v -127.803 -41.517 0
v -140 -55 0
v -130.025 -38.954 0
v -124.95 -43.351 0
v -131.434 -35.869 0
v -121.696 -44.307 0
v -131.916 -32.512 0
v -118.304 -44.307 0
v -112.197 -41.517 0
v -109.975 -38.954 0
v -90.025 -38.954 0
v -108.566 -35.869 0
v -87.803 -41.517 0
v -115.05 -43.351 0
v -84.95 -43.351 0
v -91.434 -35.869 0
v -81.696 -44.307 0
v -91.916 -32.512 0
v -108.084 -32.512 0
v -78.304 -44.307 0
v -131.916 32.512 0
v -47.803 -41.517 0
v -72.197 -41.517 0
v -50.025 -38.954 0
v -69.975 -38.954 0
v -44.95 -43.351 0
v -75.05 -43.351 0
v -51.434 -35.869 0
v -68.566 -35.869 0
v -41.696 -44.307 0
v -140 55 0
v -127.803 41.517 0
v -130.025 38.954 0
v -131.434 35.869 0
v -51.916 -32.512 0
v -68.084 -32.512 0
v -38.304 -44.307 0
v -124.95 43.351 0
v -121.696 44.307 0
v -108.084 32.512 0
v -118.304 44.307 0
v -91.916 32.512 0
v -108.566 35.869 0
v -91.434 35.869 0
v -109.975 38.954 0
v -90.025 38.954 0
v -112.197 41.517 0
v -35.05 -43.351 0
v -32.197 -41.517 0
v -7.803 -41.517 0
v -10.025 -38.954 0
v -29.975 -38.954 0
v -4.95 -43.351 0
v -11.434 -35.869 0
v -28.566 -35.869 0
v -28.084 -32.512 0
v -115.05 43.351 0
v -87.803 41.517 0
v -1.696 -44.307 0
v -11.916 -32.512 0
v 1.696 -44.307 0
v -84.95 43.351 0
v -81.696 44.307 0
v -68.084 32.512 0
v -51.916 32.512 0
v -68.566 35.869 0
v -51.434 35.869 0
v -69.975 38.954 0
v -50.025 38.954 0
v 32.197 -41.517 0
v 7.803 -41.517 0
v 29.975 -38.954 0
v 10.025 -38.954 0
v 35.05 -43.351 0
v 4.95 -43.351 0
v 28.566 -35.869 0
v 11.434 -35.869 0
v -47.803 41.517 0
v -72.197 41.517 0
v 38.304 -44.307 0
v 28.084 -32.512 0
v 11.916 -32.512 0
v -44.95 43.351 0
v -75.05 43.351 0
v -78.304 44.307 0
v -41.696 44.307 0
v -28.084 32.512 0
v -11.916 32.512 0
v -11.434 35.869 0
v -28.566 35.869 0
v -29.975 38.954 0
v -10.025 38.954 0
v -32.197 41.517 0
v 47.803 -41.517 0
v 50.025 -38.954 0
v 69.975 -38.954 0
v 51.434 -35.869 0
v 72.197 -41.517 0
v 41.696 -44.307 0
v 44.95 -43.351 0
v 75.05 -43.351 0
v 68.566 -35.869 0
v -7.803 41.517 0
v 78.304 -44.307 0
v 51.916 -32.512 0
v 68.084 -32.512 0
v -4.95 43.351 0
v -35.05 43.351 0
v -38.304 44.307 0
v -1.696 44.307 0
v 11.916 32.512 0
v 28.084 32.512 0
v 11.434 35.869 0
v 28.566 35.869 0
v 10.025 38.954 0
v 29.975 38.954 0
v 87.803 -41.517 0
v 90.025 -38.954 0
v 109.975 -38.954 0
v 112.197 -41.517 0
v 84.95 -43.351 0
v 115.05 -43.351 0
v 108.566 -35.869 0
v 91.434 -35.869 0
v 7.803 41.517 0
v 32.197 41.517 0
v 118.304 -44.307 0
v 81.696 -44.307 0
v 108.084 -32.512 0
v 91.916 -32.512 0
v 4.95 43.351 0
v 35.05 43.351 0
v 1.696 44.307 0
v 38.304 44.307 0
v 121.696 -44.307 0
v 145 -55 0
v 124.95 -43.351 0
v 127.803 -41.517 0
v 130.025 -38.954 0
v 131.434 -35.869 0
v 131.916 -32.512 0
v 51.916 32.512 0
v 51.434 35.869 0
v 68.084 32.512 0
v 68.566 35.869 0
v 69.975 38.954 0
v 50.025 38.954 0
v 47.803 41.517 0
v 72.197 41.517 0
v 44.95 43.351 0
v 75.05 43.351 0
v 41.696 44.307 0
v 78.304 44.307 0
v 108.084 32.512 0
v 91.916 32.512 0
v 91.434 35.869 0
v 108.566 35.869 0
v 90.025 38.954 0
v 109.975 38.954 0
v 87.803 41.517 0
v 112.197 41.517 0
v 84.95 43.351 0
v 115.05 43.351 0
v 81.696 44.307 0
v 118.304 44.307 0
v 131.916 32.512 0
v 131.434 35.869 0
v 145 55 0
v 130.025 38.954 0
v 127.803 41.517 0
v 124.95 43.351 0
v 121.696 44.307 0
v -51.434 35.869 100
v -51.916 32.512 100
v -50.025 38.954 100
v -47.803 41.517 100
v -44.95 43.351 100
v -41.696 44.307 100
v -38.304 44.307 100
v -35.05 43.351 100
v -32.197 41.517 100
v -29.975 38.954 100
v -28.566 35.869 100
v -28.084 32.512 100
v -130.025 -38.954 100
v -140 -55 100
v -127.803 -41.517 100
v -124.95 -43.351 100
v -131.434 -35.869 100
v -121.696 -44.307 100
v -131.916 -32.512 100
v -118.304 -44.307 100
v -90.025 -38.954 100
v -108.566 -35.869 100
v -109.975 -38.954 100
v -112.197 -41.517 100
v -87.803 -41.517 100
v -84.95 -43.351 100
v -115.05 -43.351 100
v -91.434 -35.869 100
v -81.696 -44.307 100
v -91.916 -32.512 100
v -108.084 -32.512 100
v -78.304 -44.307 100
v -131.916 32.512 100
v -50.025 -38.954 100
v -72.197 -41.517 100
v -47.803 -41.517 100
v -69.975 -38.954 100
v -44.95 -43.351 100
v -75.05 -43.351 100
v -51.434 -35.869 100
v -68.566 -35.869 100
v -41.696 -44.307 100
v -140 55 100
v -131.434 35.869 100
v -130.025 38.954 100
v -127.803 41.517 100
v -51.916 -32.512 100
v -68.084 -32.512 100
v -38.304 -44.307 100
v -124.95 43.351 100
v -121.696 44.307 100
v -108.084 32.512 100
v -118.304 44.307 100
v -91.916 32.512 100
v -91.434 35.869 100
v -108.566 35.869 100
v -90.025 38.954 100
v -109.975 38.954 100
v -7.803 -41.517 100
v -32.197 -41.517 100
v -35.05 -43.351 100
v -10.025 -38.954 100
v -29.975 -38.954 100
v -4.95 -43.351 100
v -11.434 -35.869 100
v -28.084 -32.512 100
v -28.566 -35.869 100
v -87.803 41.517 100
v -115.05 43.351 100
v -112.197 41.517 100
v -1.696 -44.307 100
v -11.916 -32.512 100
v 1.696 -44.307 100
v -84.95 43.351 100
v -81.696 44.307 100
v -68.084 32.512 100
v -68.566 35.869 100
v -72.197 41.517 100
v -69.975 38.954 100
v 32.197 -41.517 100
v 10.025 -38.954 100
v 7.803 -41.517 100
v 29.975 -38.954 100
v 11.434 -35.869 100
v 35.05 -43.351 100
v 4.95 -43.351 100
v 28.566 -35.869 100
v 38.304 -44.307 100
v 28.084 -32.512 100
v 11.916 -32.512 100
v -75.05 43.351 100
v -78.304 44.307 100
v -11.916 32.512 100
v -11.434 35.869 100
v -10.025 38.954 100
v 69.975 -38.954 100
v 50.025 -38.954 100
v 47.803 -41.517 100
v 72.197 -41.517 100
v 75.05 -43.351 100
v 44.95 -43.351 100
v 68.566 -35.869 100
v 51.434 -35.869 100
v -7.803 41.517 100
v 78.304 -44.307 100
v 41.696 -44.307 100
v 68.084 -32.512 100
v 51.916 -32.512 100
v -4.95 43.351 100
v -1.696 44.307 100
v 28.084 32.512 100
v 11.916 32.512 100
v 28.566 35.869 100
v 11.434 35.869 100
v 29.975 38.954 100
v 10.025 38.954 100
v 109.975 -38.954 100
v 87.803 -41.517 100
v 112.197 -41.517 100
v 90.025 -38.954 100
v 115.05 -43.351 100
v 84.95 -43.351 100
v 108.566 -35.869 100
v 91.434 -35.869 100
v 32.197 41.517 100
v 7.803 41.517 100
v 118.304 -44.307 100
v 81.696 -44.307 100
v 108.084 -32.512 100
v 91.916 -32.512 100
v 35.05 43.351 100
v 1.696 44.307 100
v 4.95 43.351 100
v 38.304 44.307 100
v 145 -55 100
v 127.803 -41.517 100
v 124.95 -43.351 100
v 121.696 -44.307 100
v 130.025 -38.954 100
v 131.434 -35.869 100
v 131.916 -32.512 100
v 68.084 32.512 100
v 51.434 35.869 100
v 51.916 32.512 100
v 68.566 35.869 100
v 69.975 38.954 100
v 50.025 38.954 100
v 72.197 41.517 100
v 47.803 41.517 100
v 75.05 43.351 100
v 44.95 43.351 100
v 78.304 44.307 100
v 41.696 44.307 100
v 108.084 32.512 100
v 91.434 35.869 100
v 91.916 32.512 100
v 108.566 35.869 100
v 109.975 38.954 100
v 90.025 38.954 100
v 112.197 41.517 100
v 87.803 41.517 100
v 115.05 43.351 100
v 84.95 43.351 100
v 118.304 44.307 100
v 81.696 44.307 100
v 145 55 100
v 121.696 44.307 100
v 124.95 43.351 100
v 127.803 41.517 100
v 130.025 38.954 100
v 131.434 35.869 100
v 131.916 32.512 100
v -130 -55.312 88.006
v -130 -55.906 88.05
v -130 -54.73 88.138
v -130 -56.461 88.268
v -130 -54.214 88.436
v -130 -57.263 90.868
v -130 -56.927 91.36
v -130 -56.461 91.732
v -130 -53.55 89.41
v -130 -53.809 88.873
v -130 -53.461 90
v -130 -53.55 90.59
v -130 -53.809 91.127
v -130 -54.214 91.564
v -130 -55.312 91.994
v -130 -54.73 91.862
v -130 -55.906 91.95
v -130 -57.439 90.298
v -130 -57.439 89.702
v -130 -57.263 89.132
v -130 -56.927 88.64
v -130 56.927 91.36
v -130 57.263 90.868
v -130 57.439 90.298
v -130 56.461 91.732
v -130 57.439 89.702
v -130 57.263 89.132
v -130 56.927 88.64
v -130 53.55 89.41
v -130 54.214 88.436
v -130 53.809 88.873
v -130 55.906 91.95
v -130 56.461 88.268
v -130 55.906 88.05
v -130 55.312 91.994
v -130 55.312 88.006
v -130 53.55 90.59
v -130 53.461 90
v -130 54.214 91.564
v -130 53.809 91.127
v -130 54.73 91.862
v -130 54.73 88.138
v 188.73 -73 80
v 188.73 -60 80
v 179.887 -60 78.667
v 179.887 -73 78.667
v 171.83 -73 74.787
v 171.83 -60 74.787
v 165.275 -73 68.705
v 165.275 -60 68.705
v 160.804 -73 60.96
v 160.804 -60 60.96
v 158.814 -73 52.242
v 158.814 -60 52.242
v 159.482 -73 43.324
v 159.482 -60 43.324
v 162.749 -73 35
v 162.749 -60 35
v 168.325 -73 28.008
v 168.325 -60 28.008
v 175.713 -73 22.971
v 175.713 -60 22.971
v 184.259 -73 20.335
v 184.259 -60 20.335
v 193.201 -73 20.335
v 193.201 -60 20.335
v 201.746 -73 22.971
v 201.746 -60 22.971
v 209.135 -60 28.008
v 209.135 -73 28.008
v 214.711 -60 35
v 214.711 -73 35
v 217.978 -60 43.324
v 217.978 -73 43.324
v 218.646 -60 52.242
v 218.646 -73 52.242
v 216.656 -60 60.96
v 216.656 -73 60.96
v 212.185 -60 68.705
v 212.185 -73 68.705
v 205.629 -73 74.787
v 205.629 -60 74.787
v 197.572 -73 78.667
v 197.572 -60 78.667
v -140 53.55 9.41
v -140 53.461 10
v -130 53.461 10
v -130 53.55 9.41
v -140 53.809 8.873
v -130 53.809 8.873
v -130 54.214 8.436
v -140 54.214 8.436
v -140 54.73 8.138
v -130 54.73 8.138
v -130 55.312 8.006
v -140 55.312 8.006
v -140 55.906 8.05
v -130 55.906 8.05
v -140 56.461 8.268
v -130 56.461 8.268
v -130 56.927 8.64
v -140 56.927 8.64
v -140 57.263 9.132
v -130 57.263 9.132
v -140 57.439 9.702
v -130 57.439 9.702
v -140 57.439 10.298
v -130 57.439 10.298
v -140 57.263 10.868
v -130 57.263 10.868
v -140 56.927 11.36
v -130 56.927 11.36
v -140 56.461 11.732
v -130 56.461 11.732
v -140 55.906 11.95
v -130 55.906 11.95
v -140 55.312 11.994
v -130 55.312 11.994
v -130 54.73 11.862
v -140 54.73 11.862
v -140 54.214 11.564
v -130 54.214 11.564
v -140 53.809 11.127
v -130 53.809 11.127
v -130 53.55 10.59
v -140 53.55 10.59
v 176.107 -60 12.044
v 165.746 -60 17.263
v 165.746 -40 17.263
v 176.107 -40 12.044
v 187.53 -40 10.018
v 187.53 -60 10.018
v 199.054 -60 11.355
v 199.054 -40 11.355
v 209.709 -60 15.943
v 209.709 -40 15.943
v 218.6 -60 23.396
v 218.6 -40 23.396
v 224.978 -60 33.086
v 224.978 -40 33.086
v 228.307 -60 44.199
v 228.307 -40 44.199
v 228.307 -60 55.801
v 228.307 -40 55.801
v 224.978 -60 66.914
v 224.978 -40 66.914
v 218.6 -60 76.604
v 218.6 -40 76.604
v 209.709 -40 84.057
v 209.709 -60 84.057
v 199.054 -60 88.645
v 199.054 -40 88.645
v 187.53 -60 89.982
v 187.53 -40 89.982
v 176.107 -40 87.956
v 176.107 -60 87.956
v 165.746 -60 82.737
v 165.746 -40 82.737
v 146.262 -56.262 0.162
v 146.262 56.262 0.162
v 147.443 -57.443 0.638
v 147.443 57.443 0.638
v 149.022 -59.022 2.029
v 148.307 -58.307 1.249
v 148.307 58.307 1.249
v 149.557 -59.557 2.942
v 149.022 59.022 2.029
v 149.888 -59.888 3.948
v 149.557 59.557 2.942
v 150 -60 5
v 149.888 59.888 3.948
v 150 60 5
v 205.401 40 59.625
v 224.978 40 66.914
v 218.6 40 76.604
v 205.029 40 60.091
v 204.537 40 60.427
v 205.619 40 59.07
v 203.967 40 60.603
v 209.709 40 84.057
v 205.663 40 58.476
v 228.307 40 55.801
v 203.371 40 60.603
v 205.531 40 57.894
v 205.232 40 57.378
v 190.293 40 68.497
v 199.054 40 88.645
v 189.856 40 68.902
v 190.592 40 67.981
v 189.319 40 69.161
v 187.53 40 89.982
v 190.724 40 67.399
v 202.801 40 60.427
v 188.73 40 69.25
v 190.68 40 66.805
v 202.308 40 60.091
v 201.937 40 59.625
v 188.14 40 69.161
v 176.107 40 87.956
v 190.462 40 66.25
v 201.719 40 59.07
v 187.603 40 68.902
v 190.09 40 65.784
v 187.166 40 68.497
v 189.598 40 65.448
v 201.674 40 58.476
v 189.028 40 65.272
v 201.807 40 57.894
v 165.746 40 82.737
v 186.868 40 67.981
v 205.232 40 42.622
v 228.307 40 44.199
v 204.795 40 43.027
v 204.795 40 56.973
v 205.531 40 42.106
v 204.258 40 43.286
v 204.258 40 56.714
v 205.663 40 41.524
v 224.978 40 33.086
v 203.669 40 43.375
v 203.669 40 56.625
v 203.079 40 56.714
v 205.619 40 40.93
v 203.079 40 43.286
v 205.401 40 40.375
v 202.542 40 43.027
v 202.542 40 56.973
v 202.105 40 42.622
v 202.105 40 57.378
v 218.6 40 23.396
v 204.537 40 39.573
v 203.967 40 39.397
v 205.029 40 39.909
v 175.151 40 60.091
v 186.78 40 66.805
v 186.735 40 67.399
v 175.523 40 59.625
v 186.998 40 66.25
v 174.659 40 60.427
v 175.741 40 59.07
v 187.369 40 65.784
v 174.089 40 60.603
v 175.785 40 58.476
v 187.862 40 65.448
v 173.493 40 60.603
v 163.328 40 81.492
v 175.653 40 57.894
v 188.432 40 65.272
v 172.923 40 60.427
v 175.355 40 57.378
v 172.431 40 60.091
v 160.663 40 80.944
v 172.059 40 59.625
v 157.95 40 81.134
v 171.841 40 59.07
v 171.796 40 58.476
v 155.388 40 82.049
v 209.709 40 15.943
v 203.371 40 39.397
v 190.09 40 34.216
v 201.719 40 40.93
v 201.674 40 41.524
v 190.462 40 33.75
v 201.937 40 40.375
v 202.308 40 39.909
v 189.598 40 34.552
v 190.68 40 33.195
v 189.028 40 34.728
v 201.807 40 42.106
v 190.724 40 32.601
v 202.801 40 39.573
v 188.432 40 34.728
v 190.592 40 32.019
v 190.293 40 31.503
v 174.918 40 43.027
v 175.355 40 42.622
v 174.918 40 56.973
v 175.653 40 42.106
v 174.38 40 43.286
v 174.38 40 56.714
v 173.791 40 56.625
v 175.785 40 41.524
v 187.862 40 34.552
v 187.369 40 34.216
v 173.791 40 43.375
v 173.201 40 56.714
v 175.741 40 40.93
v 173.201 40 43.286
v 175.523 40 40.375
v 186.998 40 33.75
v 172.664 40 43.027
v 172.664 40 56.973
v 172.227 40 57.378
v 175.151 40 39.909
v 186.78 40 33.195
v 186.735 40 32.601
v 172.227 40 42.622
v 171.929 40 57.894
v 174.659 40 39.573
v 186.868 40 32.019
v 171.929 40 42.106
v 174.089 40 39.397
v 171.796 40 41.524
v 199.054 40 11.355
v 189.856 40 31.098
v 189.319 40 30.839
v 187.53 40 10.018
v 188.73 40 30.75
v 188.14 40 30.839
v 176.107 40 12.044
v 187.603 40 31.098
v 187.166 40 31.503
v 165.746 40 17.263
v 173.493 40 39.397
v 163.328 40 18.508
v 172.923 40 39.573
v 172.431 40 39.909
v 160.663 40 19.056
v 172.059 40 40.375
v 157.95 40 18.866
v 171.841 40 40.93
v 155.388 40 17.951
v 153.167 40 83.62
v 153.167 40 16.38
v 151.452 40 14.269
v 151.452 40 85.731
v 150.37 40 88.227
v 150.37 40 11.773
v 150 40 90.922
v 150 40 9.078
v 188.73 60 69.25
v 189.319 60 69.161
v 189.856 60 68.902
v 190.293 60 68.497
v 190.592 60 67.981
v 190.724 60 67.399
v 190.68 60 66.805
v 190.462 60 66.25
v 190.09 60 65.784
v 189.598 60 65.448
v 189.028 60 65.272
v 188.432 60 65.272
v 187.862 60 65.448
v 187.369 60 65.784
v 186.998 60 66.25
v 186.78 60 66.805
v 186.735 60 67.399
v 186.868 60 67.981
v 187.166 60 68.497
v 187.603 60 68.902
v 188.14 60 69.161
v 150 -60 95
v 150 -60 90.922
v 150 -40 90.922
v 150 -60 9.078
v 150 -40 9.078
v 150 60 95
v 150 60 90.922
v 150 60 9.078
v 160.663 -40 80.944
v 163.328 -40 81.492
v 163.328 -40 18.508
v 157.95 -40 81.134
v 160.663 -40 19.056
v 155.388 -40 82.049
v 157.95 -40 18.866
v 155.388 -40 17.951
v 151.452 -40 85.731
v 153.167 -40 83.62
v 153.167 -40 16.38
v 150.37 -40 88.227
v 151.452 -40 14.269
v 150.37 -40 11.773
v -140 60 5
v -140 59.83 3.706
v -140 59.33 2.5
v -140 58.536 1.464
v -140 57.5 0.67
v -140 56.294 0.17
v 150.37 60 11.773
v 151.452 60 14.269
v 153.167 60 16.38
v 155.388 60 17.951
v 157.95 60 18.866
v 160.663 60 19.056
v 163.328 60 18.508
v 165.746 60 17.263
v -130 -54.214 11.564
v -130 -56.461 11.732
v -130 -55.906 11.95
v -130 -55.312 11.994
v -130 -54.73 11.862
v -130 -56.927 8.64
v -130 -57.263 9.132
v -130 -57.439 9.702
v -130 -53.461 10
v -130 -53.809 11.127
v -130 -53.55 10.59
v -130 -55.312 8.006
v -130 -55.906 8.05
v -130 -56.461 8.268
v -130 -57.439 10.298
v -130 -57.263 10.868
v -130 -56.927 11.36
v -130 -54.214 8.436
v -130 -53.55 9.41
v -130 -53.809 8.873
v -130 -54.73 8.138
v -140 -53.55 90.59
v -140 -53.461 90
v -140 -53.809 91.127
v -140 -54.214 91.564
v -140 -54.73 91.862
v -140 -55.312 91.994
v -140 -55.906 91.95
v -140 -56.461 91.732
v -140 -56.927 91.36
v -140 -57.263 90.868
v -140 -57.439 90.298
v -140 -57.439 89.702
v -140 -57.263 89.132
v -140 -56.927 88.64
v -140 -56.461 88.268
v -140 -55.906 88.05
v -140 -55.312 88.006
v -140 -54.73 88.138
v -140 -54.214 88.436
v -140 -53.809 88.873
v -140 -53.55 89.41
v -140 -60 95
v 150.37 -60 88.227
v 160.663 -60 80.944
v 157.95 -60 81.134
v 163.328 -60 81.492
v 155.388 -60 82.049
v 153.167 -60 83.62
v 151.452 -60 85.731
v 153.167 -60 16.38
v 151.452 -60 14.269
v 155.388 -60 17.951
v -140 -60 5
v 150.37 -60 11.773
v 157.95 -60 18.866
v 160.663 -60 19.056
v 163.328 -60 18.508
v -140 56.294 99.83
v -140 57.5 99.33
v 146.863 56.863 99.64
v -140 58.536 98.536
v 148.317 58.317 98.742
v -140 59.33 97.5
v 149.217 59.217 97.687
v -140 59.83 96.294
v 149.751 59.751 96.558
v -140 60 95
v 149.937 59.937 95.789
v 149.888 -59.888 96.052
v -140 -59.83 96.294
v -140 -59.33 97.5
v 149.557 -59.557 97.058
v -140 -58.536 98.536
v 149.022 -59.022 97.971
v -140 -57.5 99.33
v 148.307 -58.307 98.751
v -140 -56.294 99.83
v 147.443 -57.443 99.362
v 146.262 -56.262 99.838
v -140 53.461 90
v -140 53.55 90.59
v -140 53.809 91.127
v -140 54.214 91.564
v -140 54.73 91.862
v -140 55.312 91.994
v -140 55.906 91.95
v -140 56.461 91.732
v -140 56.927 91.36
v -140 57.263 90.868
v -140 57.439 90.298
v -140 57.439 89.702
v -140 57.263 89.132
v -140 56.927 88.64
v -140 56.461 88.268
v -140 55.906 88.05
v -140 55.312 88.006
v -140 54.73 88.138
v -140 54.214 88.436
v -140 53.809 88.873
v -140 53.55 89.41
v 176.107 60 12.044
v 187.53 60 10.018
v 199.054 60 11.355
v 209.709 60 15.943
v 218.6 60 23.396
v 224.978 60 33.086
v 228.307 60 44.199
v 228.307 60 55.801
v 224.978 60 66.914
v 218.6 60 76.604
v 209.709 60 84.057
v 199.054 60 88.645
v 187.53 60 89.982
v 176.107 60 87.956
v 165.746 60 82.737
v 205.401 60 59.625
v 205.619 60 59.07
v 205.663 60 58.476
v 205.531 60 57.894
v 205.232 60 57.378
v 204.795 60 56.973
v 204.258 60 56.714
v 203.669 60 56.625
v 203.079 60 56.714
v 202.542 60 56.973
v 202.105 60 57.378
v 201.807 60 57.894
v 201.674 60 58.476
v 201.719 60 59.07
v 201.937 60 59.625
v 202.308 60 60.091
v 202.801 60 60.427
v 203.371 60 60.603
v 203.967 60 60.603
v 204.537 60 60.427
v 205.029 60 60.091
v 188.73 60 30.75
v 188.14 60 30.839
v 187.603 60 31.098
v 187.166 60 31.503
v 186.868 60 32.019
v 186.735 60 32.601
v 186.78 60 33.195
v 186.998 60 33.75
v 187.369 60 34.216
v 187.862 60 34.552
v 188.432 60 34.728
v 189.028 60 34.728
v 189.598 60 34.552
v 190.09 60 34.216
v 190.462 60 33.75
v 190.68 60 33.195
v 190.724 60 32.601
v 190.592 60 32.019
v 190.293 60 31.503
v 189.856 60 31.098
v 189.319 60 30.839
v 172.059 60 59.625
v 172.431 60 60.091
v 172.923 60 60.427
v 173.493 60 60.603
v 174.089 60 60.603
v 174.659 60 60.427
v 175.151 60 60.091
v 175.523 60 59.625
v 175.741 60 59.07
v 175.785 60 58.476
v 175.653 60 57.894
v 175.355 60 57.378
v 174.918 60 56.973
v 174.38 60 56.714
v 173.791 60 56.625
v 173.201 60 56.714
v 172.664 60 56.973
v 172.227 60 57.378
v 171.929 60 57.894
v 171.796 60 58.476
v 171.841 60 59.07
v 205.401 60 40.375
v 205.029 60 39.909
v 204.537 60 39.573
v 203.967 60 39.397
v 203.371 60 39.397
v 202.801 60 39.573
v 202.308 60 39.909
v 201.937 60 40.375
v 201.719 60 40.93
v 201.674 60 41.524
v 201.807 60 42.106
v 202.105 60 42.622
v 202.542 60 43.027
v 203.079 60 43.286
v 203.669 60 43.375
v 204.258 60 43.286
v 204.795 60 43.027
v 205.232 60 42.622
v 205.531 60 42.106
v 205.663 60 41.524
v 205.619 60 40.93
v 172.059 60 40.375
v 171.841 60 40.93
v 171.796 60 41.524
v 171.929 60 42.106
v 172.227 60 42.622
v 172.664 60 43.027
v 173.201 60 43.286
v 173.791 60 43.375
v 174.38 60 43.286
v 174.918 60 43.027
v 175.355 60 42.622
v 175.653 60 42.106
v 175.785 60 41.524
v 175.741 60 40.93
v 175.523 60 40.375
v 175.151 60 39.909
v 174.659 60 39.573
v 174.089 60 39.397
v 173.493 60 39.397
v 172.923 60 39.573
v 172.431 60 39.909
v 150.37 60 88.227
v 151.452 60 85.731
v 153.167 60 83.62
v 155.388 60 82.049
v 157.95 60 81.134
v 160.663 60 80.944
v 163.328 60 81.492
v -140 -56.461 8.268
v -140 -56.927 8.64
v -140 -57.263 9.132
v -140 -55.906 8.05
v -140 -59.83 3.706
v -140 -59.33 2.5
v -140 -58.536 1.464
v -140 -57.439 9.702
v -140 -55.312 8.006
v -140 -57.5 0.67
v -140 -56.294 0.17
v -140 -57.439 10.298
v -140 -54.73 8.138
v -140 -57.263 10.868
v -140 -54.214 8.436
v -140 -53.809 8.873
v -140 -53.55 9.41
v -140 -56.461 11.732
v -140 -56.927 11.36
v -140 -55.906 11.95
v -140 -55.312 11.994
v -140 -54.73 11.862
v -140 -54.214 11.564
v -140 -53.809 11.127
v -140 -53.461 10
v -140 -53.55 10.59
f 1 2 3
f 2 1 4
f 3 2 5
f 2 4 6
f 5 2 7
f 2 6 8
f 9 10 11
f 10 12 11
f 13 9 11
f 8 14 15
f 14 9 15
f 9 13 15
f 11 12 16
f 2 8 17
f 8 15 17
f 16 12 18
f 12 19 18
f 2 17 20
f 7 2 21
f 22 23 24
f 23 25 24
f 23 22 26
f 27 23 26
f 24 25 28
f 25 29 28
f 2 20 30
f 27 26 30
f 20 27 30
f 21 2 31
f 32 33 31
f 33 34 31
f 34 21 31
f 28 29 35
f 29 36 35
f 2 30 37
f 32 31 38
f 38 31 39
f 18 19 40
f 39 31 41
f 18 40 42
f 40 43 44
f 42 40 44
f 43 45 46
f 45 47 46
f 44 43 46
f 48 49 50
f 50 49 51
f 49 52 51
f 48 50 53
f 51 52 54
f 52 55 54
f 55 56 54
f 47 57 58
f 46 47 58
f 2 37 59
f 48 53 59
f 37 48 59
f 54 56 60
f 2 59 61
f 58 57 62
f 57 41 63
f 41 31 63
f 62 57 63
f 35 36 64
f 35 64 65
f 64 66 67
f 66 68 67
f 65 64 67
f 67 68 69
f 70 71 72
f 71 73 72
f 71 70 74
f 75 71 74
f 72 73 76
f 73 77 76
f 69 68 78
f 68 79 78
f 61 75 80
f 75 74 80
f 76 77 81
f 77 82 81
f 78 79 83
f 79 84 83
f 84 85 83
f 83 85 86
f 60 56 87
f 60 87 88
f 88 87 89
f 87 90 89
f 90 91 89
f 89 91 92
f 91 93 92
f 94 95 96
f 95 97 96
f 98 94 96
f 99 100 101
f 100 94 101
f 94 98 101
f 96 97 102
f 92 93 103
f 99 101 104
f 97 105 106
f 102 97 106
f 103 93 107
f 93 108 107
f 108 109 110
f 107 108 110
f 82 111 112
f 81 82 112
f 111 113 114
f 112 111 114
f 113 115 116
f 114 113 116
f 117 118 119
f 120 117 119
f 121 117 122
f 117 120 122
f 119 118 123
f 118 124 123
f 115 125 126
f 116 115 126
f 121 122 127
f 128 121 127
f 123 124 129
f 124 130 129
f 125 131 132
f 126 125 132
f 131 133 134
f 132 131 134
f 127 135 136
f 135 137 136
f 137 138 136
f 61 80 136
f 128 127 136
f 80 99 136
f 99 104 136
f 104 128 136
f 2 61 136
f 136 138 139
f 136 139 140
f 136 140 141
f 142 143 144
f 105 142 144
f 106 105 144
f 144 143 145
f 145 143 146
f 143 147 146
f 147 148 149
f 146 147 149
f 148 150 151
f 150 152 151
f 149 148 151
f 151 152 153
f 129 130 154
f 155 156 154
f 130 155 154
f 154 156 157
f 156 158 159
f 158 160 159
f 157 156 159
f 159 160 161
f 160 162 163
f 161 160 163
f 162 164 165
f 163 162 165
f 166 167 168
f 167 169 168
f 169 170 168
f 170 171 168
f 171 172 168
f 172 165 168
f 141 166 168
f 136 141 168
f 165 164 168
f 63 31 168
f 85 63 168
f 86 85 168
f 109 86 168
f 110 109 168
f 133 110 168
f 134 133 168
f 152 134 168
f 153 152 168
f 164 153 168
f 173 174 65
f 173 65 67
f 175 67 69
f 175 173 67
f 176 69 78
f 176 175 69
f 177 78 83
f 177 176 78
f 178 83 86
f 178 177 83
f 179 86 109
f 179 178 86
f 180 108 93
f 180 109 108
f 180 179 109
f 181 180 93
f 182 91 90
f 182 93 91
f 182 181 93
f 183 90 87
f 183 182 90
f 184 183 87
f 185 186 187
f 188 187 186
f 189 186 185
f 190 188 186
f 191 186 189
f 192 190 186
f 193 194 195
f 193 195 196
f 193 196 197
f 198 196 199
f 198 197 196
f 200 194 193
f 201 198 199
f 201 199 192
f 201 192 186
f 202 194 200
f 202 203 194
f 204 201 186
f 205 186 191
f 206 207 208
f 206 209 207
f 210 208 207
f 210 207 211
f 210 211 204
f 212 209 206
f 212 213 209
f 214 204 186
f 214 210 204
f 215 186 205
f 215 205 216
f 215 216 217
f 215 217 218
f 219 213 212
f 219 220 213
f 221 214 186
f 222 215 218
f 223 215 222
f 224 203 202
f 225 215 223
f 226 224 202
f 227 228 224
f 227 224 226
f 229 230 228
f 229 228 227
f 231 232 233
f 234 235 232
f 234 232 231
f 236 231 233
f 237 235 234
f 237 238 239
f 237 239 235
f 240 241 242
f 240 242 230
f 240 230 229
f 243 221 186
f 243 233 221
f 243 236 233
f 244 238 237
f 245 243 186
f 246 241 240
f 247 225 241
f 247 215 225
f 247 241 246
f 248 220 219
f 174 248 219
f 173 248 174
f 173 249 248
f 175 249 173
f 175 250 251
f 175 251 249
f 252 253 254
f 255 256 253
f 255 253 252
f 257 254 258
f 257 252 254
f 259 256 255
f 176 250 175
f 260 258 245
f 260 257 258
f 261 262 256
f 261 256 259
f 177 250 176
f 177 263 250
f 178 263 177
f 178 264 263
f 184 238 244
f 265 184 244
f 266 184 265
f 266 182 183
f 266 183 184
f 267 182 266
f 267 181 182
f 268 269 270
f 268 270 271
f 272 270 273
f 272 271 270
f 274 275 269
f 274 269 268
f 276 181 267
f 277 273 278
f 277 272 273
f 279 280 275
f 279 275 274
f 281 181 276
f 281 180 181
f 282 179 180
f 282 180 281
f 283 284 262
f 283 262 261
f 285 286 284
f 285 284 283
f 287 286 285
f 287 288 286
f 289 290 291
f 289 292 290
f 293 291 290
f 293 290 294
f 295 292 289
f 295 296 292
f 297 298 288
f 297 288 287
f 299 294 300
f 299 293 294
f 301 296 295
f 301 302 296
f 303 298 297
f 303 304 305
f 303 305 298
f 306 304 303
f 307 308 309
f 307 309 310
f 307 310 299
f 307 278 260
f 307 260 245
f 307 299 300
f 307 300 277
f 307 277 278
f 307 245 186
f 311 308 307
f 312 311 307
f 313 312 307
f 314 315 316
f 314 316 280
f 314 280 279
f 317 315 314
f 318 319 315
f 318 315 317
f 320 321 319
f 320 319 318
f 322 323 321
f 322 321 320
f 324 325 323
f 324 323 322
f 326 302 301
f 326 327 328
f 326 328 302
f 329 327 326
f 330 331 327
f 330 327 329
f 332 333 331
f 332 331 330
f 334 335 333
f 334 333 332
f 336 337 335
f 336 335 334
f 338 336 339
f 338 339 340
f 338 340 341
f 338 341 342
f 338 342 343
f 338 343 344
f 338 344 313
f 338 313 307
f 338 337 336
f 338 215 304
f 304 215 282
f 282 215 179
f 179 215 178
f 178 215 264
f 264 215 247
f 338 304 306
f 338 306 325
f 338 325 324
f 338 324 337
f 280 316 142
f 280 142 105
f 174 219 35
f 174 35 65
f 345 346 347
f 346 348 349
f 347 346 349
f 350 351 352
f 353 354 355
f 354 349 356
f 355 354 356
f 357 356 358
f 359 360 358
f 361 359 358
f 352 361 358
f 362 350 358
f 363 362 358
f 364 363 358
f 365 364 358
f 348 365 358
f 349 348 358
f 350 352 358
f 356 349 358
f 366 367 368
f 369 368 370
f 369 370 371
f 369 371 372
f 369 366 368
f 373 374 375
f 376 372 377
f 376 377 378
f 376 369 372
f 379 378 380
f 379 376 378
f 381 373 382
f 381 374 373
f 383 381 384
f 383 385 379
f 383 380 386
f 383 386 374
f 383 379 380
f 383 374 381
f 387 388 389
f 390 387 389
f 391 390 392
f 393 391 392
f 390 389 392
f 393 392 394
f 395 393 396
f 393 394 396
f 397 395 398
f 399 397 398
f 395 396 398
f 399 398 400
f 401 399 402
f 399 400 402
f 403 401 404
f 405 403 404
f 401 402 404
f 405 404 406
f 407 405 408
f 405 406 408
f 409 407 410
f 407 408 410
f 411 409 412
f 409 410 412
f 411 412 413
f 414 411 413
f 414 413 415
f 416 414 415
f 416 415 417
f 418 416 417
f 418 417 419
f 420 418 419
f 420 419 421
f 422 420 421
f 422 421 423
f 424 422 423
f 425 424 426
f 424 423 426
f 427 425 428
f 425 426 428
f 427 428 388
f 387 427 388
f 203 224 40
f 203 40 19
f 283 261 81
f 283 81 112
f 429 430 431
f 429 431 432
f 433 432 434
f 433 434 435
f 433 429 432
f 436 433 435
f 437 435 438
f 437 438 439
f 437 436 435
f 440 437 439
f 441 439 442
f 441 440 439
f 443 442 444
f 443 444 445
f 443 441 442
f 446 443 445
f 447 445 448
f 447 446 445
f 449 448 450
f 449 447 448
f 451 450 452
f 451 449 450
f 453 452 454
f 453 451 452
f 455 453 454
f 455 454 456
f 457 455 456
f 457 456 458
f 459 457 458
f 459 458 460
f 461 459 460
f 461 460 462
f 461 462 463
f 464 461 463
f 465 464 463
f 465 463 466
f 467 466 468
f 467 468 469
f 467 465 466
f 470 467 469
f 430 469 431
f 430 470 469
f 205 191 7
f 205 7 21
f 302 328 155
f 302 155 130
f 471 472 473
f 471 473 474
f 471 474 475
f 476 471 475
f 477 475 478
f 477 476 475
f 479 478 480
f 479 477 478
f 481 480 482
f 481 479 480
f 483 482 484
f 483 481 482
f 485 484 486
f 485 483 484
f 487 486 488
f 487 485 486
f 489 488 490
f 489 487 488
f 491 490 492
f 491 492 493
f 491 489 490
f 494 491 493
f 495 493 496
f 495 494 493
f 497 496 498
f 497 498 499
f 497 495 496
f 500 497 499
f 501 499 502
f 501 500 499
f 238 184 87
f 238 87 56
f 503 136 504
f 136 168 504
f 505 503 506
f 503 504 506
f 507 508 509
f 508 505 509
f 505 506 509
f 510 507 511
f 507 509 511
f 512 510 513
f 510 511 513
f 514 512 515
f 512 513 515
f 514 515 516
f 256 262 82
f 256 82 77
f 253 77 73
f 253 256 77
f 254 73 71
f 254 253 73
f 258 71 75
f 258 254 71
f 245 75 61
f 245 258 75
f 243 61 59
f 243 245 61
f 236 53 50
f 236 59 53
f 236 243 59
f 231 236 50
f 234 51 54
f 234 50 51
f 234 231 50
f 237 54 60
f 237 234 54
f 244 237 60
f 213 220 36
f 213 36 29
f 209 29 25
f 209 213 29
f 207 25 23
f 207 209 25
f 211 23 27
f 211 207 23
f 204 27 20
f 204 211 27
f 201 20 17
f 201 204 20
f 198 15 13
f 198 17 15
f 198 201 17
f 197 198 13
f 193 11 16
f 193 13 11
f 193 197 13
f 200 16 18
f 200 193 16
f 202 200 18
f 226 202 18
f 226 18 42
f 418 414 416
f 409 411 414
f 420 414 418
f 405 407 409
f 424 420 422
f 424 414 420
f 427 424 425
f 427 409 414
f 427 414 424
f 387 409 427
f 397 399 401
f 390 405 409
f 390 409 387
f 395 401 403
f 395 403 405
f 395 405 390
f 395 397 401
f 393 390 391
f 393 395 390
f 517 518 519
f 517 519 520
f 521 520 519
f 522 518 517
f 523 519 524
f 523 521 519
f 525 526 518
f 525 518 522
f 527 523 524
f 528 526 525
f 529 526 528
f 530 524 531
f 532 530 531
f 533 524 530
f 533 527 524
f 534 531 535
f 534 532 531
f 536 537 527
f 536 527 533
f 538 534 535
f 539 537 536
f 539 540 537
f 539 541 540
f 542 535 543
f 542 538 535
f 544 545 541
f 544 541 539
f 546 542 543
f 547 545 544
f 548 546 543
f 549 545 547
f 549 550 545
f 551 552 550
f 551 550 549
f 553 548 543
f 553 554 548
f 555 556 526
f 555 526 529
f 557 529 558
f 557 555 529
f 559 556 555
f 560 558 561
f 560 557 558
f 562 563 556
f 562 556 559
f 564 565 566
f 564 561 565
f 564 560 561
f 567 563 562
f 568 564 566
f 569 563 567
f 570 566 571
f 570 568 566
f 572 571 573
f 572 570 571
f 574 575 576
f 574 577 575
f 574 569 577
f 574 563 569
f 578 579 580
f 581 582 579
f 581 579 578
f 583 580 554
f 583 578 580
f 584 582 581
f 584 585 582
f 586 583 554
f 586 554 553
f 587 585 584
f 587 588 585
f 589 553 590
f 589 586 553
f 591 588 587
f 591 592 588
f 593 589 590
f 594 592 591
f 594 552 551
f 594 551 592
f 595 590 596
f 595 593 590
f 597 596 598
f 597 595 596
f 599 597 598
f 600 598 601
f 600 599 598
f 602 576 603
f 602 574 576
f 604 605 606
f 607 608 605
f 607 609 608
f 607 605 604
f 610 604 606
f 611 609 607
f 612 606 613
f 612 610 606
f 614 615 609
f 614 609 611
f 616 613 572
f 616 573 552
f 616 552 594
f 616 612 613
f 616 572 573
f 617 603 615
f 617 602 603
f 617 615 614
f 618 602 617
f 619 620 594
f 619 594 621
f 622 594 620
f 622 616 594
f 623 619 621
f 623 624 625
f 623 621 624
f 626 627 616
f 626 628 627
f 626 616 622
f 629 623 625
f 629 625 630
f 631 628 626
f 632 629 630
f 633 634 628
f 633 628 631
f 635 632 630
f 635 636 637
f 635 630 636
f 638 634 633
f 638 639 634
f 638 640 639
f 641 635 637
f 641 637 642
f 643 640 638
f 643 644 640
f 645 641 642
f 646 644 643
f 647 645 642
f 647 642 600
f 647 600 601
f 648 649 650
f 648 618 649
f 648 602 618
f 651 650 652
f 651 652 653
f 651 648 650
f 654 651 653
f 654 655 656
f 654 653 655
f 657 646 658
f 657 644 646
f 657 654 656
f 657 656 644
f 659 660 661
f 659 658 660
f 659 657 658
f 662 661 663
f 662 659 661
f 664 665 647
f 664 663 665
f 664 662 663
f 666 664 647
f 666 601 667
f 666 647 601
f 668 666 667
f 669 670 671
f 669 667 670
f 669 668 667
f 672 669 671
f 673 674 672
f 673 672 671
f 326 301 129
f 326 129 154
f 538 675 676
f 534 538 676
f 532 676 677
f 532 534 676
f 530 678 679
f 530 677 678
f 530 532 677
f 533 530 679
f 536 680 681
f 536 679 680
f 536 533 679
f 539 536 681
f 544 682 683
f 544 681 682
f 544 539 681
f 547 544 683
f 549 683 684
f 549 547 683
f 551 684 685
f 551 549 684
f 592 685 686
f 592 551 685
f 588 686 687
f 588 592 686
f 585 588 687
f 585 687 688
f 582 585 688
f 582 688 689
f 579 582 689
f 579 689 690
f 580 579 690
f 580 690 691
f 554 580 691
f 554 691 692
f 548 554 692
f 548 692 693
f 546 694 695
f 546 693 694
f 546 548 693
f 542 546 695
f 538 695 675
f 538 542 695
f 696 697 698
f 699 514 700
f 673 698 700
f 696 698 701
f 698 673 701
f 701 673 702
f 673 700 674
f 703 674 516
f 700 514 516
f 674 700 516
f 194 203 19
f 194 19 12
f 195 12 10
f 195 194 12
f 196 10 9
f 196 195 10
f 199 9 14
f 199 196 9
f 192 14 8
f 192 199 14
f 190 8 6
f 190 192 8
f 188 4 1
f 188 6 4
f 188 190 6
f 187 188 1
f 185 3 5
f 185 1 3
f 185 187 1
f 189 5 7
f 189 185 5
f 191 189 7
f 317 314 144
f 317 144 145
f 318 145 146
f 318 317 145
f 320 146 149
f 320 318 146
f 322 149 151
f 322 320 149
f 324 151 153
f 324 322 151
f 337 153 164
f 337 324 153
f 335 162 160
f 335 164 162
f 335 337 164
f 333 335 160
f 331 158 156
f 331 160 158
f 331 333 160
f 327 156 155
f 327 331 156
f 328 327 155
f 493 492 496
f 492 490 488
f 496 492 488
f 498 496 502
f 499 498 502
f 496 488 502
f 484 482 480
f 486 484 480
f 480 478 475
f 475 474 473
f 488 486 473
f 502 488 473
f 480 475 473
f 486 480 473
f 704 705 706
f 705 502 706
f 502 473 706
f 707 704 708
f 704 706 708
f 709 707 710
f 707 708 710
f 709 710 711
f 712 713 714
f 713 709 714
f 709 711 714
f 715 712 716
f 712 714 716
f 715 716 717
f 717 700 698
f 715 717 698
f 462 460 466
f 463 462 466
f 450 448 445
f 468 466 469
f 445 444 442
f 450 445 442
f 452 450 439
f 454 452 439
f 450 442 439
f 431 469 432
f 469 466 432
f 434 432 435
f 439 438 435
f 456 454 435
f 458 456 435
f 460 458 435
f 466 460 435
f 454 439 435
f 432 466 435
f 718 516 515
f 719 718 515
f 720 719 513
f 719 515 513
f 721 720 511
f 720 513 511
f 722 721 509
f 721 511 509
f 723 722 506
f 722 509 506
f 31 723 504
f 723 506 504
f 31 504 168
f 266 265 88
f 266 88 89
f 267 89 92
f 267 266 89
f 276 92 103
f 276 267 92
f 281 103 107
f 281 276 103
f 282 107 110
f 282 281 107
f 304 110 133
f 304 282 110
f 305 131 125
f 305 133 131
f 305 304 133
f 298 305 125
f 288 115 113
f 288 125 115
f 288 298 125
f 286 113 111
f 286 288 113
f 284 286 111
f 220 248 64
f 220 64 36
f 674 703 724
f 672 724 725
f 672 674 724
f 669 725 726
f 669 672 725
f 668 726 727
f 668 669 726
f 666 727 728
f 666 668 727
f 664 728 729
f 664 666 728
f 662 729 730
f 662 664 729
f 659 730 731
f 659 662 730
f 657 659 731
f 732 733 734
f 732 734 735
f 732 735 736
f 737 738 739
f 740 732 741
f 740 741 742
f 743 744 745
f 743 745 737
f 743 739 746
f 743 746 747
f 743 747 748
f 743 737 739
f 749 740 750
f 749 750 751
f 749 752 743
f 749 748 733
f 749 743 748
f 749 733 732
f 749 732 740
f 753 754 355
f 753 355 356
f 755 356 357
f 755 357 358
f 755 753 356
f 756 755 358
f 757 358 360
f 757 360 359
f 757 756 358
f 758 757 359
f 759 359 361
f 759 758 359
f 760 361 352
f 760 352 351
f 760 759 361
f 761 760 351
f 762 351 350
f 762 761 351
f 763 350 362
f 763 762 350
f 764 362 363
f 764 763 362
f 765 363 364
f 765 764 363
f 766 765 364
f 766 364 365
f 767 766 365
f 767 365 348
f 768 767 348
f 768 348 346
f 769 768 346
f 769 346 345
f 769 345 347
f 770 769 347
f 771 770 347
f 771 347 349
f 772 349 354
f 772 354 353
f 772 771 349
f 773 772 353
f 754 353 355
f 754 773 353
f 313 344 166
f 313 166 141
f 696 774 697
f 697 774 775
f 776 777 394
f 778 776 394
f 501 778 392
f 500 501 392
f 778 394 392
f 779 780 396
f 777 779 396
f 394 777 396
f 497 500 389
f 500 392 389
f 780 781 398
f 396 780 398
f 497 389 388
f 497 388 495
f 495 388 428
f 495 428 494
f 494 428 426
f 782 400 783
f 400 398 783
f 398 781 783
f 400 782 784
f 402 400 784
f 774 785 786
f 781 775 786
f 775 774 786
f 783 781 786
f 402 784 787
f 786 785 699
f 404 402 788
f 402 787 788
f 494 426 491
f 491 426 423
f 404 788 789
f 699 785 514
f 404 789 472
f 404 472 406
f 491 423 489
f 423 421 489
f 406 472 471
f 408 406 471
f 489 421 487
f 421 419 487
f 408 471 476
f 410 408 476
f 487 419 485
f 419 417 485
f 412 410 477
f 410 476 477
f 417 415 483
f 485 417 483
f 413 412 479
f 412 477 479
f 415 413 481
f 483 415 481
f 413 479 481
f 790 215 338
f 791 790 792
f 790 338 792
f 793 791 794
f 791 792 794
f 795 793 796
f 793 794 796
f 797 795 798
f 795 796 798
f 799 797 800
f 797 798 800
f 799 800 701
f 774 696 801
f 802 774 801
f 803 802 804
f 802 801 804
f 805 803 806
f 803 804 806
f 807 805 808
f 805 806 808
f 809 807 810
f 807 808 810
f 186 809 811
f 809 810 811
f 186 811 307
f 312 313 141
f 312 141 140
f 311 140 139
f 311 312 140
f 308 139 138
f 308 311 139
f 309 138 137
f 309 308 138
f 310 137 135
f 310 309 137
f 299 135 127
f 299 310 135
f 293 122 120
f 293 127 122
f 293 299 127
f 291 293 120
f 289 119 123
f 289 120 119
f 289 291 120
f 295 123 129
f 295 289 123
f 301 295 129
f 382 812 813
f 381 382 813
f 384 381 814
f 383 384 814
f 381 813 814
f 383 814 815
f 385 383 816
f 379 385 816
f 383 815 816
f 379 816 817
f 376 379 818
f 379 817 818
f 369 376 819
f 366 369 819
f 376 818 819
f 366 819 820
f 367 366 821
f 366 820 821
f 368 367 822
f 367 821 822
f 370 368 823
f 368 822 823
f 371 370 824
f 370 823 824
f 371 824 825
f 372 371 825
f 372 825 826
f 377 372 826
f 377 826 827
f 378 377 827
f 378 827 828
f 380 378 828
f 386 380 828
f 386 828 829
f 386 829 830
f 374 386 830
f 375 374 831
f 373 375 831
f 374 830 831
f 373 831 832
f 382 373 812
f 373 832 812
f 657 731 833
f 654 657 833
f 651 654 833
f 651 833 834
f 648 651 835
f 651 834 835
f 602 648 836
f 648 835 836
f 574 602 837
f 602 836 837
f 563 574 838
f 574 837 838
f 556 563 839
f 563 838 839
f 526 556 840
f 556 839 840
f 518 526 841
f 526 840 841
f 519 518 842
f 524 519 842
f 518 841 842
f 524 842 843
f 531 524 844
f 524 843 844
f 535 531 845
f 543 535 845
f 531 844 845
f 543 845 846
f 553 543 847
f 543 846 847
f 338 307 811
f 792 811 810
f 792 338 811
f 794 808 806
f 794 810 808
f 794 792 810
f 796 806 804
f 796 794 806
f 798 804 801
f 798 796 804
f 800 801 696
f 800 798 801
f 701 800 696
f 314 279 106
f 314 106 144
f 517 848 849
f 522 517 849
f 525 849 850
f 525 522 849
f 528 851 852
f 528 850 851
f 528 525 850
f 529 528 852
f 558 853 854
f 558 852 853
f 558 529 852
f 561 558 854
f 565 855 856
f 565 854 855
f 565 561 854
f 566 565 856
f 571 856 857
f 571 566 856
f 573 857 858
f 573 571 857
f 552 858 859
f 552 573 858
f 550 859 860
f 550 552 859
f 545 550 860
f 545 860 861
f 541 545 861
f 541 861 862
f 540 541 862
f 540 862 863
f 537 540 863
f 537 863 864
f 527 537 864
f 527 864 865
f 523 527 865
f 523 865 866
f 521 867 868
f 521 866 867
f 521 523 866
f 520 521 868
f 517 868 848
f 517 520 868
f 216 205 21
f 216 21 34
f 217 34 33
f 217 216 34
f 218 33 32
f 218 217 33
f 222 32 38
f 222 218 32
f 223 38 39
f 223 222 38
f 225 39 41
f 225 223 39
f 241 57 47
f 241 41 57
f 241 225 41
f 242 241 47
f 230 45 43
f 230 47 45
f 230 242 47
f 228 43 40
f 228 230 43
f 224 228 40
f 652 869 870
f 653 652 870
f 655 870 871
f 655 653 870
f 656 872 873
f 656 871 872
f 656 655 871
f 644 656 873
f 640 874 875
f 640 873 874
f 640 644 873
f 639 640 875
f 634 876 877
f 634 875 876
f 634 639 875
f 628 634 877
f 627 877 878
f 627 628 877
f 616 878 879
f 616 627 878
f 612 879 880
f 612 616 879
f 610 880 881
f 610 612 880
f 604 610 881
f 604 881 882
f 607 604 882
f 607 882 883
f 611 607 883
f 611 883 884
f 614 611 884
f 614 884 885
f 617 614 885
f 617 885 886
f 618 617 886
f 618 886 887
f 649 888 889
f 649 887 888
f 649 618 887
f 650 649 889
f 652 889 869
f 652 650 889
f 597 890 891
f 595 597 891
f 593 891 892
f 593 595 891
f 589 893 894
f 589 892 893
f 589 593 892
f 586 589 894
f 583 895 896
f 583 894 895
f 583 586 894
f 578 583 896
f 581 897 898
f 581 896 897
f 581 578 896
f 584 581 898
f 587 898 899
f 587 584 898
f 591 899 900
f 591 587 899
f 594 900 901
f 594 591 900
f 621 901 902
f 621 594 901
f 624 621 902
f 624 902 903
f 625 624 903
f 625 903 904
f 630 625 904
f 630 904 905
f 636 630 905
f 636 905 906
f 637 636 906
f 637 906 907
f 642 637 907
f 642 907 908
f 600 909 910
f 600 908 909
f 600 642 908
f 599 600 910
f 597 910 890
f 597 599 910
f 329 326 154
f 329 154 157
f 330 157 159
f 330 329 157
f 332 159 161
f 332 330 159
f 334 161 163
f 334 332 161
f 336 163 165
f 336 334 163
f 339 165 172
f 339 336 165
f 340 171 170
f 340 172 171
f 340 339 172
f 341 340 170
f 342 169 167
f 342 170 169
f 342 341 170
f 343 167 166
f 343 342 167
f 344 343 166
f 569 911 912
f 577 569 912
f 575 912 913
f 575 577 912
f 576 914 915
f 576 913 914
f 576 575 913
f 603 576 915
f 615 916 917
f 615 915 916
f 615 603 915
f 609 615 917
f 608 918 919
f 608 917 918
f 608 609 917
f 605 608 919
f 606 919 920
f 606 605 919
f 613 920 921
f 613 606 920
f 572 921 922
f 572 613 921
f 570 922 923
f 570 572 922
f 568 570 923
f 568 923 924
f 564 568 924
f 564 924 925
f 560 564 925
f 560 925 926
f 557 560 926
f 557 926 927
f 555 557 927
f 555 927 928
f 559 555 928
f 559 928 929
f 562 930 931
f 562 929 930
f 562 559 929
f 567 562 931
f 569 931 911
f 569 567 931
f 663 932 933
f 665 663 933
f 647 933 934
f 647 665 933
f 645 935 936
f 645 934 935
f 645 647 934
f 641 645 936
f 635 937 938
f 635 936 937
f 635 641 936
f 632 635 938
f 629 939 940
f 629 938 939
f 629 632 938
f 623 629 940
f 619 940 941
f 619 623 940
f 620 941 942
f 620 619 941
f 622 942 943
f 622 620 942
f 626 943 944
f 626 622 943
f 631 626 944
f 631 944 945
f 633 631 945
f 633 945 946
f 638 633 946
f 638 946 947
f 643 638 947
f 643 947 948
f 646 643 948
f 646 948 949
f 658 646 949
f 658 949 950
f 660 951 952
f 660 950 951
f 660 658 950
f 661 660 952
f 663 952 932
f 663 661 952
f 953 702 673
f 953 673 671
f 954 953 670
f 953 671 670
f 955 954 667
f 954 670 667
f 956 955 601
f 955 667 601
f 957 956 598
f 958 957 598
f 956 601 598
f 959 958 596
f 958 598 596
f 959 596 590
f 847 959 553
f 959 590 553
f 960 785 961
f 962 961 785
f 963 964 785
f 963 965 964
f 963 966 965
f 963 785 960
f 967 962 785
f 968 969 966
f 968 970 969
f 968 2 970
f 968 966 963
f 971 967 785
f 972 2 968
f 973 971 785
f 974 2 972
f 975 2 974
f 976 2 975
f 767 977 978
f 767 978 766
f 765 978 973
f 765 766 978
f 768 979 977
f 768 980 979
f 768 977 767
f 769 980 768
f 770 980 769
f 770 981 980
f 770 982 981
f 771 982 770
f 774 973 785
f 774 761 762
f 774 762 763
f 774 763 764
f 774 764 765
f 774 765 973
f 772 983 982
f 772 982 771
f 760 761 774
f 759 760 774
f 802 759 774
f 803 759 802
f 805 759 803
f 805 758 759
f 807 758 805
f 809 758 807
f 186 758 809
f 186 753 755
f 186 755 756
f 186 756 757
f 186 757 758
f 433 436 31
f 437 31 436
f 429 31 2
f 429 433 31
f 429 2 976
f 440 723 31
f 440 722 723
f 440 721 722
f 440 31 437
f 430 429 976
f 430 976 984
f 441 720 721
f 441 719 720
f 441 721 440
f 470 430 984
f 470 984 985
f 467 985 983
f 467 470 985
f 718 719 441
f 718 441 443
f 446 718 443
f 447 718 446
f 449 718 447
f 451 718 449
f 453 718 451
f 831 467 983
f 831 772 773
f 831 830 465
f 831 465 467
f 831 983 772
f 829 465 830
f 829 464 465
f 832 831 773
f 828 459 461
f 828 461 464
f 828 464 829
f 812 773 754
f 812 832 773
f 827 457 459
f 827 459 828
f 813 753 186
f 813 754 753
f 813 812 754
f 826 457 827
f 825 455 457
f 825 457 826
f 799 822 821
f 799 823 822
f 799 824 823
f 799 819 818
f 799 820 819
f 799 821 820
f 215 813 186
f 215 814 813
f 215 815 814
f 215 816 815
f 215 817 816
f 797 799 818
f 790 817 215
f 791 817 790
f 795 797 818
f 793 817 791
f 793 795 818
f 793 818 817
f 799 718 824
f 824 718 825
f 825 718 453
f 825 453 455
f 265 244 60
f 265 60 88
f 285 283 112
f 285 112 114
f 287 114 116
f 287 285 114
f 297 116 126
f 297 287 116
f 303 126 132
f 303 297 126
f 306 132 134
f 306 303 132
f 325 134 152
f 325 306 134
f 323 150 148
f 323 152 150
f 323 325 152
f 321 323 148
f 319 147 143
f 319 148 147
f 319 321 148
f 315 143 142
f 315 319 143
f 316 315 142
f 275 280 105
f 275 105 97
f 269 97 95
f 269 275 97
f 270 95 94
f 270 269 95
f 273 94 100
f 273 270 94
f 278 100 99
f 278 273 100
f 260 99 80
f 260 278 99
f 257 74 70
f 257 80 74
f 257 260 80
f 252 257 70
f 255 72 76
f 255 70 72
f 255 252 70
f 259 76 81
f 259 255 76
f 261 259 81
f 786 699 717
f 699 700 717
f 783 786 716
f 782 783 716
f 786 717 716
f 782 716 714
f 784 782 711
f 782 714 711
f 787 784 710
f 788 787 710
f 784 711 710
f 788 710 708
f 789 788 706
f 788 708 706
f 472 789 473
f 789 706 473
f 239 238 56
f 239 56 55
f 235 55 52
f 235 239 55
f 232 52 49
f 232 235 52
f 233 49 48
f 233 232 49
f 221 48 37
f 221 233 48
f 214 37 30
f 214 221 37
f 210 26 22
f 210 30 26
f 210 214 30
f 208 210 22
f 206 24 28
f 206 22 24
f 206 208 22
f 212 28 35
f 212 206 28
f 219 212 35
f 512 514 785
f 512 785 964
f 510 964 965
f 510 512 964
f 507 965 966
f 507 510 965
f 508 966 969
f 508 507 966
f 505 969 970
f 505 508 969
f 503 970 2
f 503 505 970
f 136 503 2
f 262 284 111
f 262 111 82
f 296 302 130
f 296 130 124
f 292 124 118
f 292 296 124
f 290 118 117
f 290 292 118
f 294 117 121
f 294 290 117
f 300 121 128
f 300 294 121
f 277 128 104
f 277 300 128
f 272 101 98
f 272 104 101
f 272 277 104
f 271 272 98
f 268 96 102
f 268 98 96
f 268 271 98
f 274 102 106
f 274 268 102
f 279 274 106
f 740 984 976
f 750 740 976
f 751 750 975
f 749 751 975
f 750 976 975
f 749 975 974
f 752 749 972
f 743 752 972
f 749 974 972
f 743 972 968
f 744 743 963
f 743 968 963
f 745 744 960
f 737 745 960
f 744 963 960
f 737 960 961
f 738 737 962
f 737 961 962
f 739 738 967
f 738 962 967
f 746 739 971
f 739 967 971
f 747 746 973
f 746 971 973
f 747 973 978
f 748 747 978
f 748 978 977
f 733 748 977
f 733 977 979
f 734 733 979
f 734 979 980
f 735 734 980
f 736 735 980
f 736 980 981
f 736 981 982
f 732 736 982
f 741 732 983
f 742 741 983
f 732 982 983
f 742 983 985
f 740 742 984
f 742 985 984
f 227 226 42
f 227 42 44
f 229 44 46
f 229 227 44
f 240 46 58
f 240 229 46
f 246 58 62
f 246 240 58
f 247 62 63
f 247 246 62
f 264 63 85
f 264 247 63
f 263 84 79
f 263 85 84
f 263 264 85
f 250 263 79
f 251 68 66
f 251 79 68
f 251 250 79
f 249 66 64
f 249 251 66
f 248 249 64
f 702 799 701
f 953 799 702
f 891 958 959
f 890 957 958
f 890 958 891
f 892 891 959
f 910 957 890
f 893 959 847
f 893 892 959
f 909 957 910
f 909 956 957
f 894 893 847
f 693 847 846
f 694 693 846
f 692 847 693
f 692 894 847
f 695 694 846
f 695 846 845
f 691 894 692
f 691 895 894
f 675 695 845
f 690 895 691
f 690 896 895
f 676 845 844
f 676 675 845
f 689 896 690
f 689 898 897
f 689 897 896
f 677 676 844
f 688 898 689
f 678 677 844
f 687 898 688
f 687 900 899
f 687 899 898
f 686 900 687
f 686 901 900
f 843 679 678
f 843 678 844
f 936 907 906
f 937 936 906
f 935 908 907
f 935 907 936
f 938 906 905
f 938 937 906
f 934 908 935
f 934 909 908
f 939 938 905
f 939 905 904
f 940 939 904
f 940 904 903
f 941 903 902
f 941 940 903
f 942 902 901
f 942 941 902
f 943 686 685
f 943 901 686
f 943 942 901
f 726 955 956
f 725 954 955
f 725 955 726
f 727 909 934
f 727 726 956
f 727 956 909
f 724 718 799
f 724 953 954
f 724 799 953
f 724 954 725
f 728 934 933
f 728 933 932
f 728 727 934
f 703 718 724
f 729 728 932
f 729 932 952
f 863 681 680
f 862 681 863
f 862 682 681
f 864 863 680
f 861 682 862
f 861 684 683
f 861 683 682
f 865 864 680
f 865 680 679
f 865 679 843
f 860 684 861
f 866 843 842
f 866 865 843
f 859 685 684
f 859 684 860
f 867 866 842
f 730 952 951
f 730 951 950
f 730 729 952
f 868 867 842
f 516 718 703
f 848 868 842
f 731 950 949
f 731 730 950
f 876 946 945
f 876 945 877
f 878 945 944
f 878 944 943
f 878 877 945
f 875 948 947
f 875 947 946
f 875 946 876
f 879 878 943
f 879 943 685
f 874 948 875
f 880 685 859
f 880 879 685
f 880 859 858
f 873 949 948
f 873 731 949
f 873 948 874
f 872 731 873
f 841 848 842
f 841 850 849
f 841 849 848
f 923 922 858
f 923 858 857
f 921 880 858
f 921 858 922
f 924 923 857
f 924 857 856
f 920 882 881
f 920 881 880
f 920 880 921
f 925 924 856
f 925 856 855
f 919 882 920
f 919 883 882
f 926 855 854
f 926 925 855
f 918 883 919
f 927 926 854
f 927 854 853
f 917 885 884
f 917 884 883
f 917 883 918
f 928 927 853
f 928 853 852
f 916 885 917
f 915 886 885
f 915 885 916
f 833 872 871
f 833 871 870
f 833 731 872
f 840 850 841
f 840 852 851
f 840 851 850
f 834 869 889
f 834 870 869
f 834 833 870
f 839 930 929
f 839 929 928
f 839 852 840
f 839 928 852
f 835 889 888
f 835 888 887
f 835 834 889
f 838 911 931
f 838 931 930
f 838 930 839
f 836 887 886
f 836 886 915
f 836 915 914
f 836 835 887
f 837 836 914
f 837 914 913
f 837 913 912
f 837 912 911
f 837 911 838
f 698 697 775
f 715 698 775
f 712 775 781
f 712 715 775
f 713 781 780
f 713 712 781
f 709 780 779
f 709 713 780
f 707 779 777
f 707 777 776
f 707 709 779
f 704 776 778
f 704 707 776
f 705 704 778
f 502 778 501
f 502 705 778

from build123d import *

# Parameters (mm, degrees)
SKETCH_1_W                                 = 300
SKETCH_1_H                                 = 120
EXTRUDE_1_DEPTH                            = 100
EXTRUDE_2_DEPTH                            = 20
FILLET_2_R                                 = 10
FILLET_3_R                                 = 10
MIRROR_6_AT_THE_SECOND_PLANE_COPY_1_DEPTH  = 20
FILLET_10_R                                = 10
FILLET_11_R                                = 10
FILLET_12_R                                = 10
FILLET_13_R                                = 10
FILLET_14_R                                = 10
FILLET_15_R                                = 10
CUT_EXTRUDE_1_REACH                        = 258.744
PATTERN_LINEAR_1_COUNT                     = 4
PATTERN_LINEAR_1_PITCH                     = 40
PATTERN_LINEAR_1_COL_COUNT                 = 4
PATTERN_LINEAR_1_COL_PITCH                 = 40
SKETCH_4_R                                 = 30
EXTRUDE_3_DEPTH                            = 13
SKETCH_6_R                                 = 32.5
CUT_EXTRUDE_2_DEPTH                        = 283.853914089
FILLET_16_R                                = 5
CUT_EXTRUDE_6_DEPTH                        = 399.453619326
CUT_EXTRUDE_6_DEPTH_BACK                   = 10
SKETCH_10_W                                = 239.935229407
SKETCH_10_H                                = 310.477115034
SKETCH_11_R                                = 2
CUT_EXTRUDE_7_DEPTH                        = 10
MIRROR_8_AT_THE_SECOND_PLANE_COPY_1_SKET_R = 2
MIRROR_8_AT_THE_SECOND_PLANE_COPY_1_DEPTH  = 10
SKETCH_12_R                                = 2
CUT_EXTRUDE_8_DEPTH                        = 261.089093804
PATTERN_CIRCULAR_2_COUNT                   = 6


with BuildPart() as part:
    # 草图1 → 凸台-拉伸1 (new body)
    with BuildSketch(Plane.XY):
        Rectangle(SKETCH_1_W, SKETCH_1_H)
    extrude(amount=EXTRUDE_1_DEPTH)

    # 草图2 → 凸台-拉伸2 (add)
    with BuildSketch(Plane(origin=(0, 60, 0), x_dir=(1, 0, 0), z_dir=(0, 1, 0))):
        with BuildLine():
            Line((150, -50), (150, -40))
            ThreePointArc((150, -40), (228.729833462, -50), (150, -60))
            Line((150, -60), (150, -50))
        make_face()
    extrude_2 = extrude(amount=-EXTRUDE_2_DEPTH)

    # 圆角2
    fillet_2_edges = [part.edges().sort_by_distance(p)[0] for p in [
        (150, 50, 40),
    ]]
    fillet(fillet_2_edges, radius=FILLET_2_R)

    # 圆角3
    fillet_3_edges = [part.edges().sort_by_distance(p)[0] for p in [
        (150, 50, 60),
    ]]
    fillet(fillet_3_edges, radius=FILLET_3_R)

    # 镜向6: 凸台-拉伸2 across plane
    add(extrude_2.mirror(Plane(origin=(0, 0, 0), x_dir=(0, 0, 1), z_dir=(1, 0, 0))))

    # 镜向6 at the second plane: 凸台-拉伸2 across plane
    add(extrude_2.mirror(Plane.ZX))

    # 镜向6 at the second plane copy 1 sket → 镜向6 at the second plane copy 1 (add)
    with BuildSketch(Plane(origin=(0, -60, 0), x_dir=(-1, 0, 0), z_dir=(0, -1, 0))):
        with BuildLine():
            Line((150, -50), (150, -40))
            ThreePointArc((150, -40), (228.729833462, -50), (150, -60))
            Line((150, -60), (150, -50))
        make_face()
    extrude(amount=-MIRROR_6_AT_THE_SECOND_PLANE_COPY_1_DEPTH)

    # 圆角10
    fillet_10_edges = [part.edges().sort_by_distance(p)[0] for p in [
        (150, -50, 60),
    ]]
    fillet(fillet_10_edges, radius=FILLET_10_R)

    # 圆角11
    fillet_11_edges = [part.edges().sort_by_distance(p)[0] for p in [
        (150, -50, 40),
    ]]
    fillet(fillet_11_edges, radius=FILLET_11_R)

    # 圆角12
    fillet_12_edges = [part.edges().sort_by_distance(p)[0] for p in [
        (-150, 50, 40),
    ]]
    fillet(fillet_12_edges, radius=FILLET_12_R)

    # 圆角13
    fillet_13_edges = [part.edges().sort_by_distance(p)[0] for p in [
        (-150, -50, 60),
    ]]
    fillet(fillet_13_edges, radius=FILLET_13_R)

    # 圆角14
    fillet_14_edges = [part.edges().sort_by_distance(p)[0] for p in [
        (-150, 50, 60),
    ]]
    fillet(fillet_14_edges, radius=FILLET_14_R)

    # 圆角15
    fillet_15_edges = [part.edges().sort_by_distance(p)[0] for p in [
        (-150, -50, 40),
    ]]
    fillet(fillet_15_edges, radius=FILLET_15_R)

    # 草图3 → 切除-拉伸1 (cut, up to next)
    with BuildSketch(Plane.XY.offset(100), mode=Mode.PRIVATE) as cut_extrude_1_sk1:
        with BuildLine():
            Line((-11.916195323, -32.511613), (-11.916195323, 32.511613))
            ThreePointArc((-11.916195323, 32.511613), (0, 44.427808323), (11.916195323, 32.511613))
            Line((11.916195323, 32.511613), (11.916195323, -32.511613))
            ThreePointArc((11.916195323, -32.511613), (0, -44.427808323), (-11.916195323, -32.511613))
        make_face()
    cut_extrude_1_tool1 = extrude(cut_extrude_1_sk1.sketch, amount=-CUT_EXTRUDE_1_REACH, mode=Mode.PRIVATE) & part.part
    cut_extrude_1 = cut_extrude_1_tool1.solids().sort_by_distance((0, 0, 100))[0]
    add(cut_extrude_1, mode=Mode.SUBTRACT)

    # 阵列(线性)1: 切除-拉伸1 ×4
    with Locations(*[(i * PATTERN_LINEAR_1_PITCH, 0, 0) for i in range(1, PATTERN_LINEAR_1_COUNT)]):
        add(cut_extrude_1, mode=Mode.SUBTRACT)

    # 阵列(线性)1 col: 切除-拉伸1 ×4
    with Locations(*[(-i * PATTERN_LINEAR_1_COL_PITCH, 0, 0) for i in range(1, PATTERN_LINEAR_1_COL_COUNT)]):
        add(cut_extrude_1, mode=Mode.SUBTRACT)

    # 草图4 → 凸台-拉伸3 (add)
    with BuildSketch(Plane.XZ.offset(60)):
        with Locations(Location((188.729833462, 50, 0), (0, 0, 90))):
            Circle(SKETCH_4_R)
    extrude(amount=EXTRUDE_3_DEPTH)

    # 草图6 → 切除-拉伸2 (cut, through all)
    with BuildSketch(Plane(origin=(0, 60, 0), x_dir=(1, 0, 0), z_dir=(0, 1, 0))):
        with Locations(Location((-188.729833462, -50, 0), (0, 0, 270))):
            Circle(SKETCH_6_R)
    extrude(amount=-CUT_EXTRUDE_2_DEPTH, mode=Mode.SUBTRACT)

    # 圆角16
    fillet_16_edges = [part.edges().sort_by_distance(p)[0] for p in [
        (-150, 0, 100),
        (0, -60, 100),
        (150, 0, 100),
        (0, -60, 0),
        (-150, 0, 0),
        (0, 60, 0),
        (150, 0, 0),
        (0, 60, 100),
    ]]
    fillet(fillet_16_edges, radius=FILLET_16_R)

    # 草图10 → 切除-拉伸6 (cut, two sides: drawn at the far end of the back side and taken through both)
    with BuildSketch(Plane.ZY.offset(150).offset(-CUT_EXTRUDE_6_DEPTH_BACK)):
        with Locations((-5.422984107, 66.466365428)):
            Rectangle(SKETCH_10_W, SKETCH_10_H)
    extrude(amount=CUT_EXTRUDE_6_DEPTH + CUT_EXTRUDE_6_DEPTH_BACK, mode=Mode.SUBTRACT)

    # 草图11 → 切除-拉伸7 (cut)
    with BuildSketch(Plane.ZY.offset(140)):
        with Locations(Location((90, 55.461, 0), (0, 0, 270))):
            Circle(SKETCH_11_R)
    cut_extrude_7 = extrude(amount=-CUT_EXTRUDE_7_DEPTH, mode=Mode.SUBTRACT)

    # 镜向8: 切除-拉伸7 across plane
    add(cut_extrude_7.mirror(Plane.ZX), mode=Mode.SUBTRACT)

    # 镜向8 at the second plane: 切除-拉伸7 across plane
    add(cut_extrude_7.mirror(Plane.XY.offset(50)), mode=Mode.SUBTRACT)

    # 镜向8 at the second plane copy 1 sket → 镜向8 at the second plane copy 1 (cut)
    with BuildSketch(Plane(origin=(-140, 0, 100), x_dir=(0, 0, -1), z_dir=(-1, 0, 0))):
        with Locations(Location((90, 55.461, 0), (0, 0, 270))):
            Circle(MIRROR_8_AT_THE_SECOND_PLANE_COPY_1_SKET_R)
    extrude(amount=-MIRROR_8_AT_THE_SECOND_PLANE_COPY_1_DEPTH, mode=Mode.SUBTRACT)

    # 草图12 → 切除-拉伸8 (cut, through all)
    with BuildSketch(Plane(origin=(0, 0, 0), x_dir=(1, 0, 0), z_dir=(0, 1, 0))):
        with Locations(Location((188.729833462, -32.75, 0), (0, 0, 90))):
            Circle(SKETCH_12_R)
    cut_extrude_8 = extrude(amount=CUT_EXTRUDE_8_DEPTH, mode=Mode.SUBTRACT)

    # 阵列(圆周)2: 切除-拉伸8 ×6 about axis
    pattern_circular_2_axis = Axis((188.729833462, 0, 50), (0, 1, 0))
    for i in range(1, PATTERN_CIRCULAR_2_COUNT):
        add(cut_extrude_8.rotate(pattern_circular_2_axis, i * 360 / PATTERN_CIRCULAR_2_COUNT), mode=Mode.SUBTRACT)


solid = part.part
